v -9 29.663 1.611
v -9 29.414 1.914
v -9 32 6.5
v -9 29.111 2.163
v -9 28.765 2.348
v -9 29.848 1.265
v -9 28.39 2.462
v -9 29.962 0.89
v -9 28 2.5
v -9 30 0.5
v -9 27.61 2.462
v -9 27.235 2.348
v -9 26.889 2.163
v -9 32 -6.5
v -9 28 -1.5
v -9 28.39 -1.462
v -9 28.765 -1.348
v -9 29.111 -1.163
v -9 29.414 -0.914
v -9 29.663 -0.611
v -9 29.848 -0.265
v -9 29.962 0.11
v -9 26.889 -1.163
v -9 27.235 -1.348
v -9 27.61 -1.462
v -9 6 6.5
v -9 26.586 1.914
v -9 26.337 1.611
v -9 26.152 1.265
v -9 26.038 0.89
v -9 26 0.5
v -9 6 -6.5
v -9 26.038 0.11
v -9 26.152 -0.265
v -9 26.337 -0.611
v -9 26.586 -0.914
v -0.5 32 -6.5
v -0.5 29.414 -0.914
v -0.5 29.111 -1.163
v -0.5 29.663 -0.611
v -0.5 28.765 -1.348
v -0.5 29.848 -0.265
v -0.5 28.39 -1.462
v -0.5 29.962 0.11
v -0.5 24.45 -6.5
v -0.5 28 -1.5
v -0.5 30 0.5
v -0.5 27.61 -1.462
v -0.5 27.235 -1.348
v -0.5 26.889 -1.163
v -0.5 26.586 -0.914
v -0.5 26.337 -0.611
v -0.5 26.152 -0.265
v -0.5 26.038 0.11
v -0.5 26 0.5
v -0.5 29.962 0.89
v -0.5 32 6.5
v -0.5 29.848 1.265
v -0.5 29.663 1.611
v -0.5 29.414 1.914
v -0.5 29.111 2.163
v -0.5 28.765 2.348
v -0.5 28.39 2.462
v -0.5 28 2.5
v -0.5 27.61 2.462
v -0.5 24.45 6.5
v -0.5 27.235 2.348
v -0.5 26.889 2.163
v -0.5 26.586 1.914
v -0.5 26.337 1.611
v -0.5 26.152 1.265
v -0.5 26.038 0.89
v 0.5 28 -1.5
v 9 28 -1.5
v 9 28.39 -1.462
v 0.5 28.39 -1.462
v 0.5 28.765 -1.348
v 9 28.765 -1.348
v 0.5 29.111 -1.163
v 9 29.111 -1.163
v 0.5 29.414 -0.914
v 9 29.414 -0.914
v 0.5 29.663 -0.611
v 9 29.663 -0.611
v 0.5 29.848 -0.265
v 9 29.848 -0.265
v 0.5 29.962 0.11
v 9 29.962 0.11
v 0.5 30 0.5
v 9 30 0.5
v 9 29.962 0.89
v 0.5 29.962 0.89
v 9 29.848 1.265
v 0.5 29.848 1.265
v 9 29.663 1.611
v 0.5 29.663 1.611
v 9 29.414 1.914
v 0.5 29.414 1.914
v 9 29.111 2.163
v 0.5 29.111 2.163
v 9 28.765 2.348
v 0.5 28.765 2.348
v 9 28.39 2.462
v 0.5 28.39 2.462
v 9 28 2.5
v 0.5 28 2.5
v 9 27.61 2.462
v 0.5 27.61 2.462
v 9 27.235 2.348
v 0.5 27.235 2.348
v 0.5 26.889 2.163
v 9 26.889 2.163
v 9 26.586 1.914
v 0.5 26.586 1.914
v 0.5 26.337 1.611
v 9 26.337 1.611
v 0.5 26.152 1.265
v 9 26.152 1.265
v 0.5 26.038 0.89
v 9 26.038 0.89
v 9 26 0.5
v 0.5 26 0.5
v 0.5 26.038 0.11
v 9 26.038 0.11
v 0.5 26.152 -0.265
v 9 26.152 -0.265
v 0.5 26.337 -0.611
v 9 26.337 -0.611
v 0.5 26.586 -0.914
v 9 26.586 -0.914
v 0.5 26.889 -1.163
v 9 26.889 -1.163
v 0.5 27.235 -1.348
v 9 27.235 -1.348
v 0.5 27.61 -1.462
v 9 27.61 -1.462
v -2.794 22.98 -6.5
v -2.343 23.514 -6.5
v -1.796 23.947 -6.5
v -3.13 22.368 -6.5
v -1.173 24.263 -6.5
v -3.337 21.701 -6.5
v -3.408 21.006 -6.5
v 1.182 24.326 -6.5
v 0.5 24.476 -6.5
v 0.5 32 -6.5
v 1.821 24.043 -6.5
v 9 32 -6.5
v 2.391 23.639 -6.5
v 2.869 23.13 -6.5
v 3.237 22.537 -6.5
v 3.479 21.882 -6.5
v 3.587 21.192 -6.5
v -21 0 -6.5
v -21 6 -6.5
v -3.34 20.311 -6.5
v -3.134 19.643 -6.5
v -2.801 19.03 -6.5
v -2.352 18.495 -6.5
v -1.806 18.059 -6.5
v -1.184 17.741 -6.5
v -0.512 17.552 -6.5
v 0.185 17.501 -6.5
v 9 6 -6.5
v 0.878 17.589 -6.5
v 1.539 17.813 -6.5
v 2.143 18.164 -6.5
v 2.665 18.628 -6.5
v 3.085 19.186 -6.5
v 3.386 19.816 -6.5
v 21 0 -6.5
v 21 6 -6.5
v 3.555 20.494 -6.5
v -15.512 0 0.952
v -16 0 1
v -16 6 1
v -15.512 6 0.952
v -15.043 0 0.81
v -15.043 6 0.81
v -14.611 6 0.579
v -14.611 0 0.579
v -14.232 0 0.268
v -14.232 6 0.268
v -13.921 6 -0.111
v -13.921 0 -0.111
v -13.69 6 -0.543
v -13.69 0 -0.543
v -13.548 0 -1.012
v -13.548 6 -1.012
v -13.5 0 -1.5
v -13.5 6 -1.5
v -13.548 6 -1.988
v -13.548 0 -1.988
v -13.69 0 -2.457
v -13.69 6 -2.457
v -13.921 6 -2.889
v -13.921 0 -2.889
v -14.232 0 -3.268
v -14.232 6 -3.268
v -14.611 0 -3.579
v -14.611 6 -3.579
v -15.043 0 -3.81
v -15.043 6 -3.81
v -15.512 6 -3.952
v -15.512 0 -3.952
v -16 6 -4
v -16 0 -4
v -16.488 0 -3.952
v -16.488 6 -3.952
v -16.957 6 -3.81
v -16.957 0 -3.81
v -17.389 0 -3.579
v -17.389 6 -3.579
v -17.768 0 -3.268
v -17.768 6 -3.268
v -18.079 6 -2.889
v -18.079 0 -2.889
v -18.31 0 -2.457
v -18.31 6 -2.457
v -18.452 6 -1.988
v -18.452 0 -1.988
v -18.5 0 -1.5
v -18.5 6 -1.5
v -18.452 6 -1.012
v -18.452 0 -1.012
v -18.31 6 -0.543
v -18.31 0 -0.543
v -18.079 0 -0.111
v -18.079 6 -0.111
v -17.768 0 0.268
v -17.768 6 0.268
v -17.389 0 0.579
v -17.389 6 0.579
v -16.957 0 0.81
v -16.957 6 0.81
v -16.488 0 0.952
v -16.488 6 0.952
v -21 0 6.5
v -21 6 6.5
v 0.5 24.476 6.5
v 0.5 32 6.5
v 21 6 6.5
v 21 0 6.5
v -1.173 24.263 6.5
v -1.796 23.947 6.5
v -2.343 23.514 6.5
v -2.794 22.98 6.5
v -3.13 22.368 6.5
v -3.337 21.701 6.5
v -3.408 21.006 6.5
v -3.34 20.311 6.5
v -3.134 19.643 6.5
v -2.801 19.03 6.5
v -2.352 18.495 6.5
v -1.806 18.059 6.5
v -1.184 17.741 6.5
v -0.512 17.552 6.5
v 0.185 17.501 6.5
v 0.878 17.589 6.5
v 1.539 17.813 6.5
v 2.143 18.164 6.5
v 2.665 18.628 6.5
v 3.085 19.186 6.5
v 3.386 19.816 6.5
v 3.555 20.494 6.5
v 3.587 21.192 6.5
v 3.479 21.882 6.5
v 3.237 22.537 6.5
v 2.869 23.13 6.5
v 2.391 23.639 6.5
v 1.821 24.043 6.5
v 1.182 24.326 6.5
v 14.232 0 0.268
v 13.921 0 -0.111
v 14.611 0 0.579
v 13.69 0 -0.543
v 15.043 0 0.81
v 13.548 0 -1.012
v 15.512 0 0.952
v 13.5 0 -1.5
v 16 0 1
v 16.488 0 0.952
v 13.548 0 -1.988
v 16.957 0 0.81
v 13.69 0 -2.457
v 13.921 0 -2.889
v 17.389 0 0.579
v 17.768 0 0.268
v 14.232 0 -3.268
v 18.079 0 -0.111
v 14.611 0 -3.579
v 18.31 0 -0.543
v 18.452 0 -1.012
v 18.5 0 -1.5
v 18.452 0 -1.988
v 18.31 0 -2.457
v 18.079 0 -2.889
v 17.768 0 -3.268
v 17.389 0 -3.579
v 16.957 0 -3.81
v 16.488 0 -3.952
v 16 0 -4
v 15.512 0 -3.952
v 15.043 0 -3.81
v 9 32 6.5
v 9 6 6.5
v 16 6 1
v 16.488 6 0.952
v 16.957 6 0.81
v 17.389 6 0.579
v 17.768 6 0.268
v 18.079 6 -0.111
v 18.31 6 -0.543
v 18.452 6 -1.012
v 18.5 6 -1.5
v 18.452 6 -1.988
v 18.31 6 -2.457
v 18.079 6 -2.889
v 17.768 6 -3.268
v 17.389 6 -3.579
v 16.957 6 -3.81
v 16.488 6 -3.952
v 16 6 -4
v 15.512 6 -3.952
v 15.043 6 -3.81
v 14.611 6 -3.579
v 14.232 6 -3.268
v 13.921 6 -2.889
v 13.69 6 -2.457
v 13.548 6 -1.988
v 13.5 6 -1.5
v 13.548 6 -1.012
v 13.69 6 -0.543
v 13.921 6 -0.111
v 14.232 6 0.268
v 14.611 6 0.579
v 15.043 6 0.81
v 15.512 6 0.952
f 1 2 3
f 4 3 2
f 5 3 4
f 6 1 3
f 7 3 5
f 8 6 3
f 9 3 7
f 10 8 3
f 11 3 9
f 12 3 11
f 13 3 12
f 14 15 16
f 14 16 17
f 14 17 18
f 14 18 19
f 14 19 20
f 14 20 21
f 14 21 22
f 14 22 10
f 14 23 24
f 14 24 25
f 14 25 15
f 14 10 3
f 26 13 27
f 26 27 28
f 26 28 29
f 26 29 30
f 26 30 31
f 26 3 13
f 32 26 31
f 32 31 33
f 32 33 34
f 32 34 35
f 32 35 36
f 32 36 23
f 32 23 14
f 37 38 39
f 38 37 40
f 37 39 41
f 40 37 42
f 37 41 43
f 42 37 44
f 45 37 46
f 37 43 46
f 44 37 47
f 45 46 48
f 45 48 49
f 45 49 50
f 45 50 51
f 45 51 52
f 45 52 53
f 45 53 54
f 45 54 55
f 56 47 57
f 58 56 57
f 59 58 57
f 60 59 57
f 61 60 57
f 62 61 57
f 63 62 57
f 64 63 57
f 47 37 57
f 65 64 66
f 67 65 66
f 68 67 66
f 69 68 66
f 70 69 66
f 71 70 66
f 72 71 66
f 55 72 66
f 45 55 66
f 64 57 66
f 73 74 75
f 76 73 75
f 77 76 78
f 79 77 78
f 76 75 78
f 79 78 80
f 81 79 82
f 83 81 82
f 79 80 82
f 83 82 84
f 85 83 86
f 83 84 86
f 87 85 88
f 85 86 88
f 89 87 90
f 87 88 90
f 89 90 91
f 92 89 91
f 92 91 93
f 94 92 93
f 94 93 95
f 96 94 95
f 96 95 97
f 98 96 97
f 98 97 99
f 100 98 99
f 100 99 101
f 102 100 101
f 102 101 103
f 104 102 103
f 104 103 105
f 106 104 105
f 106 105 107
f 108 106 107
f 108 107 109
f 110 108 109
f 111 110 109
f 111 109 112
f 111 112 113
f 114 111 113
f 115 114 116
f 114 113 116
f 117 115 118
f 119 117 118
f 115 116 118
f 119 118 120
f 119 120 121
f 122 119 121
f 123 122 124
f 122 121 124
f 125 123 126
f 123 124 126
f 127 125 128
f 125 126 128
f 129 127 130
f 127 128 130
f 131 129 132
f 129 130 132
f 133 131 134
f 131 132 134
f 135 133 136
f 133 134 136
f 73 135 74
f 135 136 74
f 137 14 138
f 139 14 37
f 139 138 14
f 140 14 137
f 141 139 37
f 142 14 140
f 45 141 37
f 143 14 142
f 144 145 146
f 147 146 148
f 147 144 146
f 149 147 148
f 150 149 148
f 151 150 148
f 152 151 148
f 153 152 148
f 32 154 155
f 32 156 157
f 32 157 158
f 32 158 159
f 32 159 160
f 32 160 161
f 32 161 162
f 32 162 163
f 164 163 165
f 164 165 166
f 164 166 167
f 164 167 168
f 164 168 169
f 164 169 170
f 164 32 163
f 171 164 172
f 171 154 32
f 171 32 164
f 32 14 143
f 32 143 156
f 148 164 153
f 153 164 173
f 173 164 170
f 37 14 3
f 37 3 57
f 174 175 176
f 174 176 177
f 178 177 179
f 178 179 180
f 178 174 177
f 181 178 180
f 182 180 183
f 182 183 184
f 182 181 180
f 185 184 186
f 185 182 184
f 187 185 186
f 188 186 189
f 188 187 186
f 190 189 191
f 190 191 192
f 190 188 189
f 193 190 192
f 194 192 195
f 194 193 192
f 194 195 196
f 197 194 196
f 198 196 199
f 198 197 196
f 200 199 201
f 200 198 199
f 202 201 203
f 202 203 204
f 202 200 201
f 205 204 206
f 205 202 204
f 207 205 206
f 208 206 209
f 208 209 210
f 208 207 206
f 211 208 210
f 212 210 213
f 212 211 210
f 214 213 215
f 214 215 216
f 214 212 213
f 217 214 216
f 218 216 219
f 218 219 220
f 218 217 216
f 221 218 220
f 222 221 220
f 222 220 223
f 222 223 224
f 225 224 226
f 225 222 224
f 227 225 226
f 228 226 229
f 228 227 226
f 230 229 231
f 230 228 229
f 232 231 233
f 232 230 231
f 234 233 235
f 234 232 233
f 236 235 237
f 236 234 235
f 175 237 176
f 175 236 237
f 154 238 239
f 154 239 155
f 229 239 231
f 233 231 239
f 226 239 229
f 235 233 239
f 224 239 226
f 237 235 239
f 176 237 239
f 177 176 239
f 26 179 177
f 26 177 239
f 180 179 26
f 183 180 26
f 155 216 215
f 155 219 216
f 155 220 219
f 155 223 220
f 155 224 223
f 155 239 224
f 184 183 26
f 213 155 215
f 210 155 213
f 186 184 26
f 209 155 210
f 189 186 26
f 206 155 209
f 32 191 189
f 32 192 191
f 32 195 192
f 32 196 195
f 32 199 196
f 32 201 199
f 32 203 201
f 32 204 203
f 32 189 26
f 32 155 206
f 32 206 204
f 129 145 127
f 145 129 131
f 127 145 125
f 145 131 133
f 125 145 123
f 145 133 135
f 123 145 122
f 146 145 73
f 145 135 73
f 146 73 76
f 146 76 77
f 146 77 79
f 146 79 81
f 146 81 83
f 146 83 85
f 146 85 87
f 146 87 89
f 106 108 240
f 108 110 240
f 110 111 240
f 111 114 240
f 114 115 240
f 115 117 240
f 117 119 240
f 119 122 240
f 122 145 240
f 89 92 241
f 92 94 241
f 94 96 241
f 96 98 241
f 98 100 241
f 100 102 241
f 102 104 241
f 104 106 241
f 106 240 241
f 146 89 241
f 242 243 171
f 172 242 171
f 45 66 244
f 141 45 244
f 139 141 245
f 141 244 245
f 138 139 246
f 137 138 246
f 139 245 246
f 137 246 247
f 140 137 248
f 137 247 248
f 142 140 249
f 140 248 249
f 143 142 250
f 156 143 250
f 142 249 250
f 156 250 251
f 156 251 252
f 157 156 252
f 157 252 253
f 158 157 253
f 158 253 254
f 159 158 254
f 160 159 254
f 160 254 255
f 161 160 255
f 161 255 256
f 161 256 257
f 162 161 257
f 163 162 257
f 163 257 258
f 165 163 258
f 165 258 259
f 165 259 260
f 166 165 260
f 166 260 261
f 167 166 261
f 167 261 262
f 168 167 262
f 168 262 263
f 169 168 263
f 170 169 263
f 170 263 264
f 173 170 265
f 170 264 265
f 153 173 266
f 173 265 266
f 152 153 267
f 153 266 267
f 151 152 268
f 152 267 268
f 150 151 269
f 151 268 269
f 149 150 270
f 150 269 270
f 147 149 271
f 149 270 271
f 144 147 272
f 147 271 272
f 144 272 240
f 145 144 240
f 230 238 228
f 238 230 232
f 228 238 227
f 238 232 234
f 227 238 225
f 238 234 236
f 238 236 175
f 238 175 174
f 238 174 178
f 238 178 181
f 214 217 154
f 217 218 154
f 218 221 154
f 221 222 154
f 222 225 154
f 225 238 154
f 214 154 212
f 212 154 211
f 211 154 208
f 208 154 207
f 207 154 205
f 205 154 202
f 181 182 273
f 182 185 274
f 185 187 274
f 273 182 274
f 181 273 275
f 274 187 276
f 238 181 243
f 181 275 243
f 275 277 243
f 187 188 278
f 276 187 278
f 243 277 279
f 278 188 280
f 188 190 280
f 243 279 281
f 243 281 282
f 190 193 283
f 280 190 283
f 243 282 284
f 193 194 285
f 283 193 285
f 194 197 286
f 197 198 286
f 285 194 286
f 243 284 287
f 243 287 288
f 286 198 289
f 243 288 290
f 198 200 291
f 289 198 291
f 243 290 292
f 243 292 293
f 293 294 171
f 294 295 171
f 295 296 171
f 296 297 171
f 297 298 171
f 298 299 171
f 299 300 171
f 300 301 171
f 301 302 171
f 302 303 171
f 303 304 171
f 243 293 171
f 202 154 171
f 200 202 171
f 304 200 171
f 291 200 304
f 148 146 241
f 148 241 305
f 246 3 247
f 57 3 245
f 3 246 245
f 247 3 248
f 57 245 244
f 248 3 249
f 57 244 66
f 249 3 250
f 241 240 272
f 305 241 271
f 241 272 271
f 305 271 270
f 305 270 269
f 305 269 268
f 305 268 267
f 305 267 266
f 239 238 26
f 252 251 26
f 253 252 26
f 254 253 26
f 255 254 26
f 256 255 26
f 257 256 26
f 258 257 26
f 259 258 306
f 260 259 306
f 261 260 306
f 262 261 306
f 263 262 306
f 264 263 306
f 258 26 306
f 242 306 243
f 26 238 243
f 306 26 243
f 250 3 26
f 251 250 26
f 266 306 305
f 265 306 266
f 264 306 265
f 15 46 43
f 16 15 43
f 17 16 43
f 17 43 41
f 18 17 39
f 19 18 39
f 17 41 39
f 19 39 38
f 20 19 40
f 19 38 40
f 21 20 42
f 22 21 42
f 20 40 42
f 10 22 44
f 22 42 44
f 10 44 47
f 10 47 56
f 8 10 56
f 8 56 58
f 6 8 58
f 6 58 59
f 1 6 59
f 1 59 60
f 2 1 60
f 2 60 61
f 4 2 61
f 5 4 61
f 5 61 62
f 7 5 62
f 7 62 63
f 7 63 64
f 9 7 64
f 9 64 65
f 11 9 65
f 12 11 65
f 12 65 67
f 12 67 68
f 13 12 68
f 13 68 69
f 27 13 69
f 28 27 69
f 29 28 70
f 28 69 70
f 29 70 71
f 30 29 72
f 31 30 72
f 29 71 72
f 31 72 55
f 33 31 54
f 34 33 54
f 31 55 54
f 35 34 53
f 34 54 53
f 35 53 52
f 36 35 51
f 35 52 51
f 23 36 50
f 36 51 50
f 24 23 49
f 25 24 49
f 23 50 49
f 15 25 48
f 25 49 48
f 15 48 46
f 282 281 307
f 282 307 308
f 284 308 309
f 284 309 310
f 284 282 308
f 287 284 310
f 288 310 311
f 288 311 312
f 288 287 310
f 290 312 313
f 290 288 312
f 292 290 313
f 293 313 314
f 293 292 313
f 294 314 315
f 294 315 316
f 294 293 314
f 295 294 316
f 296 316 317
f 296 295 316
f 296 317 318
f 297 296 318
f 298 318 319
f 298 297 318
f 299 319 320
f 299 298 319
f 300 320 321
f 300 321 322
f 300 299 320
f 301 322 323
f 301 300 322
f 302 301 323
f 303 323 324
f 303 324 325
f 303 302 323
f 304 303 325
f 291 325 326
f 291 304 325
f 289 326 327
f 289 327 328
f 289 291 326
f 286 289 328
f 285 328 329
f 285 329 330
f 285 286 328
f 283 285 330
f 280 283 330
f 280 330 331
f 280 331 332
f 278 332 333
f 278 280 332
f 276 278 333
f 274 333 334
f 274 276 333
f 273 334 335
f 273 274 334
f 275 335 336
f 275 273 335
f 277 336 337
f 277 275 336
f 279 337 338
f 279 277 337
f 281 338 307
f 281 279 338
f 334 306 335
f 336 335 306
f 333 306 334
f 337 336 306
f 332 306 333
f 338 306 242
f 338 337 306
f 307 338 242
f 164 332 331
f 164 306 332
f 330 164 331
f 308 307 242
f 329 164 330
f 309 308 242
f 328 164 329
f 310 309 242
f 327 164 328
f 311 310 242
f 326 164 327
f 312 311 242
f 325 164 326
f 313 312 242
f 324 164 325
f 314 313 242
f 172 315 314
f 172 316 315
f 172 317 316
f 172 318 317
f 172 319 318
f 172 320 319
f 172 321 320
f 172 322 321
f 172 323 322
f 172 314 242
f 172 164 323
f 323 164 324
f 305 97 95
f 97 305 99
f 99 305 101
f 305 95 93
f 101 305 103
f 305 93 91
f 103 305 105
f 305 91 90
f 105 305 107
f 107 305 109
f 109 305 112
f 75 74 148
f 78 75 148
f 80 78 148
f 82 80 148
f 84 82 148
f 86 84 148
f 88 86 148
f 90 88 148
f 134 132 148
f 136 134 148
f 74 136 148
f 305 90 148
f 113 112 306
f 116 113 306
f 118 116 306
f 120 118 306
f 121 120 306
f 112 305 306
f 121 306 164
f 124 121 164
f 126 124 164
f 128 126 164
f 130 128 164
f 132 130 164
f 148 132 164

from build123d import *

# Parameters (mm, degrees)
SKETCH1_W           = 42
SKETCH1_H           = 13
SKETCH1_R           = 2.5
BOSS_EXTRUDE1_DEPTH = 6
SKETCH2_W           = 18
SKETCH2_H           = 13
BOSS_EXTRUDE2_DEPTH = 26
SKETCH3_R           = 3.5
CUT_EXTRUDE1_DEPTH  = 26
SKETCH4_R           = 2
CUT_EXTRUDE2_DEPTH  = 26


with BuildPart() as part:
    # Sketch1 → Boss-Extrude1 (new body)
    with BuildSketch(Plane(origin=(0, 0, 0), x_dir=(1, 0, 0), z_dir=(0, 1, 0))):
        Rectangle(SKETCH1_W, SKETCH1_H)
        with Locations(Location((-16, 1.5, 0), (0, 0, 270))):
            Circle(SKETCH1_R, mode=Mode.SUBTRACT)
        with Locations(Location((16, 1.5, 0), (0, 0, 270))):
            Circle(SKETCH1_R, mode=Mode.SUBTRACT)
    extrude(amount=BOSS_EXTRUDE1_DEPTH)

    # Sketch2 → Boss-Extrude2 (add)
    with BuildSketch(Plane(origin=(0, 6, 0), x_dir=(1, 0, 0), z_dir=(0, 1, 0))):
        Rectangle(SKETCH2_W, SKETCH2_H)
    extrude(amount=BOSS_EXTRUDE2_DEPTH)

    # Sketch3 → Cut-Extrude1 (cut)
    with BuildSketch(Plane.XY.offset(6.5)):
        with Locations((0.091950453, 21)):
            Circle(SKETCH3_R)
        with BuildLine():
            Line((0.5, 32), (-0.5, 32))
            Line((-0.5, 32), (-0.5, 24.449578911))
            ThreePointArc((-0.5, 24.449578911), (-0.000953562, 24.49876676), (0.5, 24.476132271))
            Line((0.5, 24.476132271), (0.5, 32))
        make_face()
    extrude(amount=-CUT_EXTRUDE1_DEPTH, mode=Mode.SUBTRACT)

    # Sketch4 → Cut-Extrude2 (cut)
    with BuildSketch(Plane(origin=(9, 0, 0), x_dir=(0, 0, -1), z_dir=(1, 0, 0))):
        with Locations((-0.5, 28)):
            Circle(SKETCH4_R)
    extrude(amount=-CUT_EXTRUDE2_DEPTH, mode=Mode.SUBTRACT)


solid = part.part
